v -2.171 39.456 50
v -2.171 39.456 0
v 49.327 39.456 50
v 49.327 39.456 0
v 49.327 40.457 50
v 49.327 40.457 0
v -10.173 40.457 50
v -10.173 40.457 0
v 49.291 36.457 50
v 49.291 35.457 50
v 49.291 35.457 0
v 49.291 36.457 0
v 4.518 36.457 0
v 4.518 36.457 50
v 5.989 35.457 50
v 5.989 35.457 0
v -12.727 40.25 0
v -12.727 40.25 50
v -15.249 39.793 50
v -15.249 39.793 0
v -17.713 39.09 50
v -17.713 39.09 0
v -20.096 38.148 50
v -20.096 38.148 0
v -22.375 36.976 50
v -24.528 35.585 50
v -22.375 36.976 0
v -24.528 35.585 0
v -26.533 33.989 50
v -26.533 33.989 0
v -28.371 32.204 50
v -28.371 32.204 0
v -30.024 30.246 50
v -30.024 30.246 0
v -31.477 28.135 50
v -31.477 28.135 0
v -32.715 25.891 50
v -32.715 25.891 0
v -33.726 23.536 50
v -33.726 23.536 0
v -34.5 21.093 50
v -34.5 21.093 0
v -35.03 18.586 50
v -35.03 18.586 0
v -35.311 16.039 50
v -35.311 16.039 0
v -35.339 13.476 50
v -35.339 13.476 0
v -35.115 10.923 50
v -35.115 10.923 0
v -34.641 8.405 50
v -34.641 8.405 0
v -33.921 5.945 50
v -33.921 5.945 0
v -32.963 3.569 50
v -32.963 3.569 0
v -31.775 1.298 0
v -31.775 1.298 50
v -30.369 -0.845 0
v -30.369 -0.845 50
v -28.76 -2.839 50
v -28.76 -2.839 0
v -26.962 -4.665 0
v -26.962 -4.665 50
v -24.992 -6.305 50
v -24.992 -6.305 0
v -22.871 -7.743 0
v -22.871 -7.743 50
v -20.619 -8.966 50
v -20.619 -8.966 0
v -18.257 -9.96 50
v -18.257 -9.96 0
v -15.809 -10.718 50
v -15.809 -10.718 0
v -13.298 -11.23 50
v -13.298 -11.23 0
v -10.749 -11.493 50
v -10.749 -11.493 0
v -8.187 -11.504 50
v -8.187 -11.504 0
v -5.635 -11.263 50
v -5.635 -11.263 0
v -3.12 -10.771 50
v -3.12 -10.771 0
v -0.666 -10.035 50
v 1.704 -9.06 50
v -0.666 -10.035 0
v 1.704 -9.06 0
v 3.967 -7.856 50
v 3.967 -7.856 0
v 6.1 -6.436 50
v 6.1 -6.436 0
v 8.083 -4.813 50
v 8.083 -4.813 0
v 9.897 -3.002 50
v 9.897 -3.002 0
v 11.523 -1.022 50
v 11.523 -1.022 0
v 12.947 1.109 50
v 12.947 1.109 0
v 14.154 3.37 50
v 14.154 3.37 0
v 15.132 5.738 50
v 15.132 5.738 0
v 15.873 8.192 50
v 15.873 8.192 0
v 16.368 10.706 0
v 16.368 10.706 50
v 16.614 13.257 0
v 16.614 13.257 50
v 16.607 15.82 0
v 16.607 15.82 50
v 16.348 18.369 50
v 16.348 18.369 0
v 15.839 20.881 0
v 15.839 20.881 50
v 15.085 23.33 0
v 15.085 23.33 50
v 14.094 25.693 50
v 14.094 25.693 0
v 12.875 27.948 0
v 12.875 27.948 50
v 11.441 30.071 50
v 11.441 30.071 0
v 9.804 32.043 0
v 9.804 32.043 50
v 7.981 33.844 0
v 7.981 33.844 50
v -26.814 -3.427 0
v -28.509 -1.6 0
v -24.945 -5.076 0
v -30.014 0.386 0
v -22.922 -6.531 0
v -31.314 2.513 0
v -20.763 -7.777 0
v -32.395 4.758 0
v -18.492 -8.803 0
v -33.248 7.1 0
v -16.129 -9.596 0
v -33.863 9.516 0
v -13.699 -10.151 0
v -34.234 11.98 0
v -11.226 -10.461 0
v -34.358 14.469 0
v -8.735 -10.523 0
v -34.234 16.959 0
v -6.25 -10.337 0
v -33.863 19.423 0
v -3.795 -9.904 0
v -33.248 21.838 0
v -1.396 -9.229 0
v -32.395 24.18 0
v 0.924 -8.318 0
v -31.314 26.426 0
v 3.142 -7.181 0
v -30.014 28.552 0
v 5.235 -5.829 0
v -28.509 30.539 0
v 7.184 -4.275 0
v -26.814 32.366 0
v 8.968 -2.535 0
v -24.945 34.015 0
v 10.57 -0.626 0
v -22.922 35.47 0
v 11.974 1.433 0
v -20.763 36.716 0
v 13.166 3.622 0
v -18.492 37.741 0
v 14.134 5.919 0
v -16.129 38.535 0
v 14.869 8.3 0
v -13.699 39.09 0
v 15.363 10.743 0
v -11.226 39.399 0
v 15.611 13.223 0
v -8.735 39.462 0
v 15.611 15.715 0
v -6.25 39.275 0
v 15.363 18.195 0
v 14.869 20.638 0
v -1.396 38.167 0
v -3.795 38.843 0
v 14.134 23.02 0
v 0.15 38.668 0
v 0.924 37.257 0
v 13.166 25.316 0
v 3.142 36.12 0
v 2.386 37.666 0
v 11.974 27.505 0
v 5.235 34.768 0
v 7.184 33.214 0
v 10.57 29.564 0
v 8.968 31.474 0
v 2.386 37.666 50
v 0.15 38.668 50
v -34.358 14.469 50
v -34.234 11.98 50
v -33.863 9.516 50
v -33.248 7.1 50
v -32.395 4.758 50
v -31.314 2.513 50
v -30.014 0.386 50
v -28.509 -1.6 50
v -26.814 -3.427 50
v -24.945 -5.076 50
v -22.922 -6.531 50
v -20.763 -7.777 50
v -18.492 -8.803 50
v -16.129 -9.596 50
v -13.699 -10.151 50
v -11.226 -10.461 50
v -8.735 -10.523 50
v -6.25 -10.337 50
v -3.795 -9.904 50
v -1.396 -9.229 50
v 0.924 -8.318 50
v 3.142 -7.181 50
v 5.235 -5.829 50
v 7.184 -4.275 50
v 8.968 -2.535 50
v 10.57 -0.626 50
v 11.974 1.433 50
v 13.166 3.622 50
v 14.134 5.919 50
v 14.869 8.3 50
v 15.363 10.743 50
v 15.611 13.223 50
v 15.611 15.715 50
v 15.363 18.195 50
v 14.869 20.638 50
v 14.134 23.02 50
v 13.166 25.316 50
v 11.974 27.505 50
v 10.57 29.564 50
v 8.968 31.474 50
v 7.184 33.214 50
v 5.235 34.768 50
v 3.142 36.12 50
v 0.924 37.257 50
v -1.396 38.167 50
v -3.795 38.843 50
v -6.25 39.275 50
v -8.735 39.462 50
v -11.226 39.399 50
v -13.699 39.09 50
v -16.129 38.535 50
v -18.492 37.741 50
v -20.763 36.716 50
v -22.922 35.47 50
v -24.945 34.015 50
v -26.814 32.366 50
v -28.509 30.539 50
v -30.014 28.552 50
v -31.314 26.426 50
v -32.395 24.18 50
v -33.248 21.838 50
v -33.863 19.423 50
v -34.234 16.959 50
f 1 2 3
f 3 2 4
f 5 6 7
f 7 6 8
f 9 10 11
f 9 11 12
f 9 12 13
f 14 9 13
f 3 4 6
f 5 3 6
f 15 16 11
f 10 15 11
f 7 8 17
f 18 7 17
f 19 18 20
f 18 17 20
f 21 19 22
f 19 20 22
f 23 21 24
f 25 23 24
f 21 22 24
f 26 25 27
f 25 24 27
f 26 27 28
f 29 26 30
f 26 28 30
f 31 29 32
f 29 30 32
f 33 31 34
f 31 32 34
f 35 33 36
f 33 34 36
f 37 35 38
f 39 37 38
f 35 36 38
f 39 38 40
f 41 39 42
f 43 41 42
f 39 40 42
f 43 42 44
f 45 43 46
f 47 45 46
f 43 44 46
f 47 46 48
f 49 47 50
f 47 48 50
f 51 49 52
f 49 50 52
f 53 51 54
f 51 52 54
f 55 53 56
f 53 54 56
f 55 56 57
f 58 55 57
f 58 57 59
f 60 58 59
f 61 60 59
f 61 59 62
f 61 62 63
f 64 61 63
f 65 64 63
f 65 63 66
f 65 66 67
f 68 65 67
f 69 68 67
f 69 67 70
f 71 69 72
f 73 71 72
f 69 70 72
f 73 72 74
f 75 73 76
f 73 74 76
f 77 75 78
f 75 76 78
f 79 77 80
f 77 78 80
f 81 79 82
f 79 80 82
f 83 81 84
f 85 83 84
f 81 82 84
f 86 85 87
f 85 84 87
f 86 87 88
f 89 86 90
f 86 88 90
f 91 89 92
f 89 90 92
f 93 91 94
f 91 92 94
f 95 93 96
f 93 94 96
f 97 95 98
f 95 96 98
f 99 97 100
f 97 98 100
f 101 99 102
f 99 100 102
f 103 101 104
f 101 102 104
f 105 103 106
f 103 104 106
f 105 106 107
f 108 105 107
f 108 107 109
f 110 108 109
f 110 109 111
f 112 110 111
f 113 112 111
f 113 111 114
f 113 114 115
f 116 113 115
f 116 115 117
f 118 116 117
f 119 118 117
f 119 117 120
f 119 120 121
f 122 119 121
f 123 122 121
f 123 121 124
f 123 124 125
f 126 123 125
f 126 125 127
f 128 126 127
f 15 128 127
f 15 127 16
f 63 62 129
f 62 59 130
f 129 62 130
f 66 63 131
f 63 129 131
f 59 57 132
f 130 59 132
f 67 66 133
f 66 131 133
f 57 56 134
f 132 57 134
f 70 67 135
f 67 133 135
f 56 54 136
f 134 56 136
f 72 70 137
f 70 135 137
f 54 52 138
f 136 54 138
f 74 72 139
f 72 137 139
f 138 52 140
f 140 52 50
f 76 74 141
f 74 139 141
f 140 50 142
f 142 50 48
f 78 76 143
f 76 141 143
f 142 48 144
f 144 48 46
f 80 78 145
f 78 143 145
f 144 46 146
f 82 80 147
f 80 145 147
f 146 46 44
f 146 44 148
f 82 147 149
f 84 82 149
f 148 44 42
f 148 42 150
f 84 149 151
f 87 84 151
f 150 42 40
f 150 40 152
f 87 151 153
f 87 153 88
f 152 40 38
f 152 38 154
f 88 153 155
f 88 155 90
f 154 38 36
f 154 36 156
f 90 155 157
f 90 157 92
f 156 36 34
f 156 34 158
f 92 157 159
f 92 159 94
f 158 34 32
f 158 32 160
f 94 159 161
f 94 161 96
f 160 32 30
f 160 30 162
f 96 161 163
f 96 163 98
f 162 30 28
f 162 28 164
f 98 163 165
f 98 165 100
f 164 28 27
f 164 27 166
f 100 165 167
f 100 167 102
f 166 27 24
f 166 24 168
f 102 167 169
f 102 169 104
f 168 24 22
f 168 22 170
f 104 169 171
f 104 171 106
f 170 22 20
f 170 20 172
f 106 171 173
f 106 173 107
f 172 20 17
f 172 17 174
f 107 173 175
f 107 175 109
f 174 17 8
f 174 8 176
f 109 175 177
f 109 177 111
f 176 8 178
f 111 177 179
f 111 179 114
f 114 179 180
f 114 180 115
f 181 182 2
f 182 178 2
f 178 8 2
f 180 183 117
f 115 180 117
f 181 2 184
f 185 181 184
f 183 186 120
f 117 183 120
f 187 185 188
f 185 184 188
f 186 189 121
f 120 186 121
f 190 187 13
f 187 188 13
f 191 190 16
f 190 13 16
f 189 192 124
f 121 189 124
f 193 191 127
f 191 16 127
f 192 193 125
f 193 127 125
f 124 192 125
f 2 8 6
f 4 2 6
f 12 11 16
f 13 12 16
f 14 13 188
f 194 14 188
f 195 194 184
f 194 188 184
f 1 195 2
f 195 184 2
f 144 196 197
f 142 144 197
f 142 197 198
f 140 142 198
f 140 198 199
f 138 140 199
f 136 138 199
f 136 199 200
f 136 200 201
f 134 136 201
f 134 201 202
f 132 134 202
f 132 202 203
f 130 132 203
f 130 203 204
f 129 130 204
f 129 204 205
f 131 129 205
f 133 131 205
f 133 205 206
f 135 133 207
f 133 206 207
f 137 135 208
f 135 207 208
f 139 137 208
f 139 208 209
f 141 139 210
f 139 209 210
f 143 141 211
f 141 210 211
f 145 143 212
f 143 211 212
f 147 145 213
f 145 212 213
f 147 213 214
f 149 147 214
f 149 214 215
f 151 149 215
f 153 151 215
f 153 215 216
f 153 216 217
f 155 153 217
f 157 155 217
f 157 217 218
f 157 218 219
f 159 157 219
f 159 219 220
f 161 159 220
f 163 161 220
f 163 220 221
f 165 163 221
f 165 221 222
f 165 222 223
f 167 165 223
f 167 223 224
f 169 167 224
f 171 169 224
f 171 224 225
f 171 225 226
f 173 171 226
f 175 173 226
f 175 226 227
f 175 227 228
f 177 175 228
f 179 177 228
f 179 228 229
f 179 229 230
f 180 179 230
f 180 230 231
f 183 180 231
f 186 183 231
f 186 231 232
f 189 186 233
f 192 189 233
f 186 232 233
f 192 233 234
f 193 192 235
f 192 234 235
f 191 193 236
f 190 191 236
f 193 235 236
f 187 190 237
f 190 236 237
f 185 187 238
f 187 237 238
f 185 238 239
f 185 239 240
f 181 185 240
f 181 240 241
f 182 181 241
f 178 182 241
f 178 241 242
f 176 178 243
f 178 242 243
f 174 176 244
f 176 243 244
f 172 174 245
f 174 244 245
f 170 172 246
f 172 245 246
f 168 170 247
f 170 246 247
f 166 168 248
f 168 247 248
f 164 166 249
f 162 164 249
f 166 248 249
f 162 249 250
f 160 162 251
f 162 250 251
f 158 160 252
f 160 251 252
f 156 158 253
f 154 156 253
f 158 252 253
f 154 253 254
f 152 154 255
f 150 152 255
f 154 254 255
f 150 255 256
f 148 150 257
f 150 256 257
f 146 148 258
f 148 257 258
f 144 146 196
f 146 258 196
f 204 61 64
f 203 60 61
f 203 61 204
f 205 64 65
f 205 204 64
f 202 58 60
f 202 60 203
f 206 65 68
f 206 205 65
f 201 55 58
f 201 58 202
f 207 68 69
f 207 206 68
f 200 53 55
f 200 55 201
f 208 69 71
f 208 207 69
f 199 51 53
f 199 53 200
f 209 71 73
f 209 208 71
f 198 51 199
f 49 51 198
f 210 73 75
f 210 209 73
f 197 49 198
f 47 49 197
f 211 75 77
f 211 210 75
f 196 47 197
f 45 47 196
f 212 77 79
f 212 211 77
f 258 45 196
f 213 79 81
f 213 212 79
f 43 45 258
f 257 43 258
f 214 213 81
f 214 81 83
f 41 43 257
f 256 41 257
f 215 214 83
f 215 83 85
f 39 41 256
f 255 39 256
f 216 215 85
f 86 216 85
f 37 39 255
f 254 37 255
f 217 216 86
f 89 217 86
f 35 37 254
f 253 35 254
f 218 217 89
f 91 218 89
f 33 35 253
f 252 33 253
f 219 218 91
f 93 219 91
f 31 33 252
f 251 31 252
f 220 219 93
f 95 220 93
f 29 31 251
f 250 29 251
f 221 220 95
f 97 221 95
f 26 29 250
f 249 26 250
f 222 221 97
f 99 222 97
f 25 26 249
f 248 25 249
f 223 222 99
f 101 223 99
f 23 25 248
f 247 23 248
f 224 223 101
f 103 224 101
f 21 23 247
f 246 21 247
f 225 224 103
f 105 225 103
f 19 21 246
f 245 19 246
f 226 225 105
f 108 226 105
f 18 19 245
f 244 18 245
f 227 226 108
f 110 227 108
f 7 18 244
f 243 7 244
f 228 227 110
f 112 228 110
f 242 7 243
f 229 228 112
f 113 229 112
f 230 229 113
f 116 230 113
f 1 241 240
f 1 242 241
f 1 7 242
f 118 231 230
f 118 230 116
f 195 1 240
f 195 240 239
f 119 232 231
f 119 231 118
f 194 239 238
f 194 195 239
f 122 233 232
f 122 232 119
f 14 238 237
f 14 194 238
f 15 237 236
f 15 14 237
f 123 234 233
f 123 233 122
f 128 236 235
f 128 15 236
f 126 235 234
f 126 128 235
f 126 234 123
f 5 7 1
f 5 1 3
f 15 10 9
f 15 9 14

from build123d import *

# Parameters (mm, degrees)
F1_DEPTH = 50
F3_D     = 50


# Not quite as in the source:
# - the program builds the solid bodies; features that only make, move or delete a surface that nothing else refers to are left out


with BuildPart() as f1:
    # F0 (on Top) → F1 (new body)
    with BuildSketch(Plane.XY):
        with BuildLine():
            Line((49.3272994906, 40.4565469784), (-10.1727005094, 40.4565469784))
            ThreePointArc((-10.1727005094, 40.4565469784), (-17.0425953064, -10.3691748199), (5.9889720653, 35.4565423621))
            Line((5.9889720653, 35.4565423621), (49.2908384362, 35.4565423621))
            Line((49.2908384362, 35.4565423621), (49.2908384362, 36.4565423621))
            Line((49.2908384362, 36.4565423621), (4.5184440125, 36.4565423621))
            ThreePointArc((4.5184440125, 36.4565423621), (1.2797957907, 38.1934060872), (-2.1713849513, 39.4562953896))
            Line((-2.1713849513, 39.4562953896), (49.3272994906, 39.4562953896))
            Line((49.3272994906, 39.4562953896), (49.3272994906, 40.4565469784))
        make_face()
        with BuildLine():
            ThreePointArc((-10.1647124973, 39.4562953896), (8.0319806239, 32.4298558016), (15.6417905006, 14.4693077177))
            ThreePointArc((15.6417905006, 14.4693077177), (-26.7483996228, -3.4912403662), (-10.1647124973, 39.4562953896))
        make_face(mode=Mode.SUBTRACT)
        with BuildLine():
            ThreePointArc((-10.1647124973, 39.4562953896), (-26.7483996228, -3.4912403662), (15.6417905006, 14.4693077177))
            ThreePointArc((15.6417905006, 14.4693077177), (8.0319806239, 32.4298558016), (-10.1647124973, 39.4562953896))
        make_face()
    extrude(amount=F1_DEPTH)

    # F3 (through all)
    with Locations(Plane(origin=(0, 0, 0), x_dir=(1, 0, 0), z_dir=(0, 0, -1))):
        with Locations((-9.3582094994, -14.4693077177)):
            Hole(F3_D / 2)


solid = f1.part
